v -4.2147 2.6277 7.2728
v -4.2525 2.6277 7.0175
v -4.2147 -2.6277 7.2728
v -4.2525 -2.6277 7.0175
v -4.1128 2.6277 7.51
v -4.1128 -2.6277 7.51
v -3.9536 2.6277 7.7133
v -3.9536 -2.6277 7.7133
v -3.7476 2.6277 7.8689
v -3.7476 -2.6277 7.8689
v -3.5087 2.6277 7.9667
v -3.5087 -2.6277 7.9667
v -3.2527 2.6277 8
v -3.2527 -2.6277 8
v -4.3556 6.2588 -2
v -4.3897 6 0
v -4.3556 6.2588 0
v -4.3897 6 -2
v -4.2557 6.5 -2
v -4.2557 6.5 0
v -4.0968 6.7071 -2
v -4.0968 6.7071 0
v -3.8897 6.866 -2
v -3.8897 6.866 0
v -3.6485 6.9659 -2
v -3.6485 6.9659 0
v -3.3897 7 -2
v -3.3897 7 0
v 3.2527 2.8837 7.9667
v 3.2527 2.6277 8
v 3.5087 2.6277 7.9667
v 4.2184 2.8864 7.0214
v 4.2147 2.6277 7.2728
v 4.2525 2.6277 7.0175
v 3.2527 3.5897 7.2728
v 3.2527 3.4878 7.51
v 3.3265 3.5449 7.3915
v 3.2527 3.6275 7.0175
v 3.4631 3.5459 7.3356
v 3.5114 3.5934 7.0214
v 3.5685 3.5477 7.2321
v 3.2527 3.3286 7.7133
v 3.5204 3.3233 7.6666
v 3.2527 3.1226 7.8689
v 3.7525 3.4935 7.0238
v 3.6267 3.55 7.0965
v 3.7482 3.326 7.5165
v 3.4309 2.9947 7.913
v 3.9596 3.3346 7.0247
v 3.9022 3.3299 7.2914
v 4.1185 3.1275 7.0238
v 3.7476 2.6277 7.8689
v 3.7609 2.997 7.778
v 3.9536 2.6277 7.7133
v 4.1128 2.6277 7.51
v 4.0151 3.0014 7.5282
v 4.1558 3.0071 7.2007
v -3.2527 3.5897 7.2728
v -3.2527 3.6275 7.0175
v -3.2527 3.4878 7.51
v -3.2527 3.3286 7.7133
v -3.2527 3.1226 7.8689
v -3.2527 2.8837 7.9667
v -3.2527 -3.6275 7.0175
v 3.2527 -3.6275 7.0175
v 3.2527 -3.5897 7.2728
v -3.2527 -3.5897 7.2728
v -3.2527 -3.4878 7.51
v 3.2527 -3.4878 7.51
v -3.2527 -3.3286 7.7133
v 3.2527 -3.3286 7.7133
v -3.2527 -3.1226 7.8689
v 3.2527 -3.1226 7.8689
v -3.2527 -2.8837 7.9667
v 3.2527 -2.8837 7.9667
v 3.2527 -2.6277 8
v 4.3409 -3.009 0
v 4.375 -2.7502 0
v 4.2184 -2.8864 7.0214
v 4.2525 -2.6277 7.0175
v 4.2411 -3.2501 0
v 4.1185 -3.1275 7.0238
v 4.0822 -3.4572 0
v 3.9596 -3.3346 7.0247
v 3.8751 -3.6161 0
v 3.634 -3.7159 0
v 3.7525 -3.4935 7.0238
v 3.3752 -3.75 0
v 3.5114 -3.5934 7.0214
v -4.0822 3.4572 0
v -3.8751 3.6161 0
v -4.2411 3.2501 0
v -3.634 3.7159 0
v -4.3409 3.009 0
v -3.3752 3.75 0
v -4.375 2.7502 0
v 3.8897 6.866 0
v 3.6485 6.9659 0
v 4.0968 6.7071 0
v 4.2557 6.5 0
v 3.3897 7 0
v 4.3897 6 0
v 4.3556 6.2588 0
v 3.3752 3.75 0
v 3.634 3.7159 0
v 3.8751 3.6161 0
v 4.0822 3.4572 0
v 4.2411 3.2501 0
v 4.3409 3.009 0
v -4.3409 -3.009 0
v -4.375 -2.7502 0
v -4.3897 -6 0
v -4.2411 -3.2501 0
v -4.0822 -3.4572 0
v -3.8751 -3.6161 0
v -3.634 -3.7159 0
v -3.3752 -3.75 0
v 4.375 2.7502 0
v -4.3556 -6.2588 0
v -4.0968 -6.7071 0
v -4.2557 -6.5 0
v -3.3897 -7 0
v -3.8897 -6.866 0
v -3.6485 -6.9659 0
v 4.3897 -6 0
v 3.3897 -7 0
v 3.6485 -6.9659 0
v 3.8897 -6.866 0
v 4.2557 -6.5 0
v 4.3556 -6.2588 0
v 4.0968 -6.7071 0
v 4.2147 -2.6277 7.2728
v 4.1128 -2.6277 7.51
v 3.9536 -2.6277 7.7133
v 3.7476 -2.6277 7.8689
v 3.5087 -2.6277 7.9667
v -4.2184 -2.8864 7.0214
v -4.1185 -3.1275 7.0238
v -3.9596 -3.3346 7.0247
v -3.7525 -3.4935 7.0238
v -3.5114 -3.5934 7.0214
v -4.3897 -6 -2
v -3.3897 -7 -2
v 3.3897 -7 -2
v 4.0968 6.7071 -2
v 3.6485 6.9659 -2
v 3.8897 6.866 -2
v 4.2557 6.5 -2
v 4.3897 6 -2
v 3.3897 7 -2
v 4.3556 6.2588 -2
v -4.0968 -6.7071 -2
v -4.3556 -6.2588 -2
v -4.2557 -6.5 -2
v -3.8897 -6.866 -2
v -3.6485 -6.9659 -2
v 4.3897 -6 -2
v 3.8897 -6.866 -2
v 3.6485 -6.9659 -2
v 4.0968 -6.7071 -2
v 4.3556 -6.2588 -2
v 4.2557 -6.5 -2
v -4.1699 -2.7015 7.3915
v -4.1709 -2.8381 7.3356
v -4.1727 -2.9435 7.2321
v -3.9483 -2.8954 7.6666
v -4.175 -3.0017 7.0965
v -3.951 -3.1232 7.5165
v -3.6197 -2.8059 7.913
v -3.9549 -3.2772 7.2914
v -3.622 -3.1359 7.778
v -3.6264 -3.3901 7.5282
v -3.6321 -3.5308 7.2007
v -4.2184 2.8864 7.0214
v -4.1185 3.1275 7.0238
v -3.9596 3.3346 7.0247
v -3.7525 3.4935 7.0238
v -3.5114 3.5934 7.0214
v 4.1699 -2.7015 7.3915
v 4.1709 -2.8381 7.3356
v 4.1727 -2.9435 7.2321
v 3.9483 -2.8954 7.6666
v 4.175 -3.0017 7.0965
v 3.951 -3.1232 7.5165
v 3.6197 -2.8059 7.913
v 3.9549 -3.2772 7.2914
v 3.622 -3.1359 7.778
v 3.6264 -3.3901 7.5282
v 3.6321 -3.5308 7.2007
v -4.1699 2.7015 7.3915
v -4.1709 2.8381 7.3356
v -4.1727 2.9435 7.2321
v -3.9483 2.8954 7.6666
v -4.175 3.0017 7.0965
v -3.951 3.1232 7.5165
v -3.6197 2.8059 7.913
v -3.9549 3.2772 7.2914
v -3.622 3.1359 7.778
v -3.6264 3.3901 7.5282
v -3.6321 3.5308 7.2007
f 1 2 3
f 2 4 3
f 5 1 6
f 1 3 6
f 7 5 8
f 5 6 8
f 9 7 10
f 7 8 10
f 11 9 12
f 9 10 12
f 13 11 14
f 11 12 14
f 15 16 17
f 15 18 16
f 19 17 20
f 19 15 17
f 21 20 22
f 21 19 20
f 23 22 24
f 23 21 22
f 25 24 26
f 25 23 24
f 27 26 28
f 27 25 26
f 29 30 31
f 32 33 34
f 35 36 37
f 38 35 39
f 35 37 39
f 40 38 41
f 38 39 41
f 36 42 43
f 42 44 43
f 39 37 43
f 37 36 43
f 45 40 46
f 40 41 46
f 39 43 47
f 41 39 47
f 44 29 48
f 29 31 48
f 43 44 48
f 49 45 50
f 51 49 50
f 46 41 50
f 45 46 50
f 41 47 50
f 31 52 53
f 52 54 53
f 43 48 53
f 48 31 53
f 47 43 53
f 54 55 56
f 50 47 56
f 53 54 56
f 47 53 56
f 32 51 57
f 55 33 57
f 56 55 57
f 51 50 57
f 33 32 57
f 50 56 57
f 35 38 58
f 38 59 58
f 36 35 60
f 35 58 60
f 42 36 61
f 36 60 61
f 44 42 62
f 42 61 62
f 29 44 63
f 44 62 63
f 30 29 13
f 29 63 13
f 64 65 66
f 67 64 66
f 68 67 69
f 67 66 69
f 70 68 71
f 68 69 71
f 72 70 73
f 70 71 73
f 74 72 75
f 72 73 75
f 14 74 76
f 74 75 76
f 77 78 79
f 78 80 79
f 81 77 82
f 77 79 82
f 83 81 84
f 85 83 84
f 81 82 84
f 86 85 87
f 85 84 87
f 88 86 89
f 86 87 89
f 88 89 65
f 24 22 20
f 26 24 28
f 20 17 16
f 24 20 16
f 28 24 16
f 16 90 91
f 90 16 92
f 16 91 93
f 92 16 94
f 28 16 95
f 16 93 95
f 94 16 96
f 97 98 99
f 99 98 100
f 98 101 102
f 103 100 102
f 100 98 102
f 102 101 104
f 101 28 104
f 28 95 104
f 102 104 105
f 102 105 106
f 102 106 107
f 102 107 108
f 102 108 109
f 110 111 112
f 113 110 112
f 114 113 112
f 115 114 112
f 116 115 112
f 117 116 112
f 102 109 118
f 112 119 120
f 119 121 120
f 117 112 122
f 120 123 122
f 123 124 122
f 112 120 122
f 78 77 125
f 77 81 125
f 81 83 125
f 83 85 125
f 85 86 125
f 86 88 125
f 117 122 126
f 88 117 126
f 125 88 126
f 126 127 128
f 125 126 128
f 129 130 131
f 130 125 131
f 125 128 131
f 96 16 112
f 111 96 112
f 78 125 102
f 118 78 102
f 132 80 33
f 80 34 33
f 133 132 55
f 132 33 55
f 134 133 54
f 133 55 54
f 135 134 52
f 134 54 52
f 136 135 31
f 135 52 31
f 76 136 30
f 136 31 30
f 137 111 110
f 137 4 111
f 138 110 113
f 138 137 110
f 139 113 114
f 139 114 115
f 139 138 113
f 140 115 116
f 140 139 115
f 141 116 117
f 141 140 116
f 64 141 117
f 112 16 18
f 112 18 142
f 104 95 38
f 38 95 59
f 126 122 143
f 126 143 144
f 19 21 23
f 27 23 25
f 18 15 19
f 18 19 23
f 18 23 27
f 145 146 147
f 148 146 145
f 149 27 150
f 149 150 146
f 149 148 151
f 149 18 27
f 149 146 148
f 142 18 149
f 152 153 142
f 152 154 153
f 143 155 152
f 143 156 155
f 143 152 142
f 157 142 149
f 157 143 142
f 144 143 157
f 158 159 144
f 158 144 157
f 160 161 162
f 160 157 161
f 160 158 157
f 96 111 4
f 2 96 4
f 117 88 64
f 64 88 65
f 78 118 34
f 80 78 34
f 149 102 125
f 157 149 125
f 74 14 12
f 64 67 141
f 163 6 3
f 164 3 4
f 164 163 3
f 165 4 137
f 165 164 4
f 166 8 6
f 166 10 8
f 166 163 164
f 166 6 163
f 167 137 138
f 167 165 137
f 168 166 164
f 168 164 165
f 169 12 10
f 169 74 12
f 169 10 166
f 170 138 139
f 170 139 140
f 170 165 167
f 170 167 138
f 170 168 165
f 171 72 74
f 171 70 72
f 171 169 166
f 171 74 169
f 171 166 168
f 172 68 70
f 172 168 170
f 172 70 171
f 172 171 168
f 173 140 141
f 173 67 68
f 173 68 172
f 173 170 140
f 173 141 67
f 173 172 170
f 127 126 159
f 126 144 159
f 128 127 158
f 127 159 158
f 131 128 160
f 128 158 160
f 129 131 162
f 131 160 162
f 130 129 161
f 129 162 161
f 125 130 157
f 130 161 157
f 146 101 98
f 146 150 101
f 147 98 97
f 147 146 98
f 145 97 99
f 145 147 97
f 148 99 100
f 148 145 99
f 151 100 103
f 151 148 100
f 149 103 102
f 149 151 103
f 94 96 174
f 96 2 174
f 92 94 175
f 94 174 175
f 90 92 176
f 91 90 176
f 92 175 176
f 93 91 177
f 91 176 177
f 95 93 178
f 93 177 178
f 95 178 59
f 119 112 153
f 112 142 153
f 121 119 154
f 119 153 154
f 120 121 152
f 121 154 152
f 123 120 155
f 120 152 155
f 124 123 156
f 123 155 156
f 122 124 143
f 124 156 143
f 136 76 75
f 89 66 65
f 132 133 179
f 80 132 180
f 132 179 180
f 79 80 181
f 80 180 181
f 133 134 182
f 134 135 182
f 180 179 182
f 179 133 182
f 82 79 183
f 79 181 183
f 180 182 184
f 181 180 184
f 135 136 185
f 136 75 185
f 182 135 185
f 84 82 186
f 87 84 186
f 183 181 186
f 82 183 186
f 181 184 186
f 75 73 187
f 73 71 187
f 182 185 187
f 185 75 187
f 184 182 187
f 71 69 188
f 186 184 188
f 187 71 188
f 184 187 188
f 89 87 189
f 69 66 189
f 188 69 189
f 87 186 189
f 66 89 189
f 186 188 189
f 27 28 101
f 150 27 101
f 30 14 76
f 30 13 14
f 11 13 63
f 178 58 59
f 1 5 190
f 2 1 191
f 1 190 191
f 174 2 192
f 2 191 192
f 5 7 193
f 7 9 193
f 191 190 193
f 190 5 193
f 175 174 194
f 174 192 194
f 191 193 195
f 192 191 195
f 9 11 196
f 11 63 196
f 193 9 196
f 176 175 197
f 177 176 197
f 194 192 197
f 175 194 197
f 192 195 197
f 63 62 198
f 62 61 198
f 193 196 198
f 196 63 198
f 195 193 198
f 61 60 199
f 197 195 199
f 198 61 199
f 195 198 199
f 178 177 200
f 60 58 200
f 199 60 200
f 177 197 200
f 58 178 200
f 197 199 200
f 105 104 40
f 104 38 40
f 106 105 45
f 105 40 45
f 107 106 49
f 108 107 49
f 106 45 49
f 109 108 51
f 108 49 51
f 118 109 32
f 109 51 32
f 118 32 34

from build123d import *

# Parameters (mm, degrees)
F0_W     = 8.75
F0_H     = 7.5
F1_DEPTH = 8
F1_TAPER = 1
F2_W     = 8.7793770789
F2_H     = 14
F3_DEPTH = 2
F4_R     = 1


with BuildPart() as f1:
    # F0 (on Top) → F1 (new body)
    with BuildSketch(Plane.XY):
        Rectangle(F0_W, F0_H)
    extrude(amount=F1_DEPTH, taper=F1_TAPER)

    # F2 (on face) → F3 (join)
    with BuildSketch(Plane(origin=(0, 0, 0), x_dir=(1, 0, 0), z_dir=(0, 0, -1))):
        Rectangle(F2_W, F2_H)
    extrude(amount=F3_DEPTH)

    # F4
    f4_edges = [f1.edges().sort_by_distance(p)[0] for p in [
        (0, -3.610359, 8),
        (4.235359, 0, 8),
        (0, 3.610359, 8),
        (-4.235359, 0, 8),
        (4.30518, -3.68018, 4),
        (-4.30518, -3.68018, 4),
        (-4.30518, 3.68018, 4),
        (4.30518, 3.68018, 4),
        (4.389689, -7, -1),
        (-4.389689, -7, -1),
        (4.389689, 7, -1),
        (-4.389689, 7, -1),
    ]]
    fillet(f4_edges, radius=F4_R)


solid = f1.part
